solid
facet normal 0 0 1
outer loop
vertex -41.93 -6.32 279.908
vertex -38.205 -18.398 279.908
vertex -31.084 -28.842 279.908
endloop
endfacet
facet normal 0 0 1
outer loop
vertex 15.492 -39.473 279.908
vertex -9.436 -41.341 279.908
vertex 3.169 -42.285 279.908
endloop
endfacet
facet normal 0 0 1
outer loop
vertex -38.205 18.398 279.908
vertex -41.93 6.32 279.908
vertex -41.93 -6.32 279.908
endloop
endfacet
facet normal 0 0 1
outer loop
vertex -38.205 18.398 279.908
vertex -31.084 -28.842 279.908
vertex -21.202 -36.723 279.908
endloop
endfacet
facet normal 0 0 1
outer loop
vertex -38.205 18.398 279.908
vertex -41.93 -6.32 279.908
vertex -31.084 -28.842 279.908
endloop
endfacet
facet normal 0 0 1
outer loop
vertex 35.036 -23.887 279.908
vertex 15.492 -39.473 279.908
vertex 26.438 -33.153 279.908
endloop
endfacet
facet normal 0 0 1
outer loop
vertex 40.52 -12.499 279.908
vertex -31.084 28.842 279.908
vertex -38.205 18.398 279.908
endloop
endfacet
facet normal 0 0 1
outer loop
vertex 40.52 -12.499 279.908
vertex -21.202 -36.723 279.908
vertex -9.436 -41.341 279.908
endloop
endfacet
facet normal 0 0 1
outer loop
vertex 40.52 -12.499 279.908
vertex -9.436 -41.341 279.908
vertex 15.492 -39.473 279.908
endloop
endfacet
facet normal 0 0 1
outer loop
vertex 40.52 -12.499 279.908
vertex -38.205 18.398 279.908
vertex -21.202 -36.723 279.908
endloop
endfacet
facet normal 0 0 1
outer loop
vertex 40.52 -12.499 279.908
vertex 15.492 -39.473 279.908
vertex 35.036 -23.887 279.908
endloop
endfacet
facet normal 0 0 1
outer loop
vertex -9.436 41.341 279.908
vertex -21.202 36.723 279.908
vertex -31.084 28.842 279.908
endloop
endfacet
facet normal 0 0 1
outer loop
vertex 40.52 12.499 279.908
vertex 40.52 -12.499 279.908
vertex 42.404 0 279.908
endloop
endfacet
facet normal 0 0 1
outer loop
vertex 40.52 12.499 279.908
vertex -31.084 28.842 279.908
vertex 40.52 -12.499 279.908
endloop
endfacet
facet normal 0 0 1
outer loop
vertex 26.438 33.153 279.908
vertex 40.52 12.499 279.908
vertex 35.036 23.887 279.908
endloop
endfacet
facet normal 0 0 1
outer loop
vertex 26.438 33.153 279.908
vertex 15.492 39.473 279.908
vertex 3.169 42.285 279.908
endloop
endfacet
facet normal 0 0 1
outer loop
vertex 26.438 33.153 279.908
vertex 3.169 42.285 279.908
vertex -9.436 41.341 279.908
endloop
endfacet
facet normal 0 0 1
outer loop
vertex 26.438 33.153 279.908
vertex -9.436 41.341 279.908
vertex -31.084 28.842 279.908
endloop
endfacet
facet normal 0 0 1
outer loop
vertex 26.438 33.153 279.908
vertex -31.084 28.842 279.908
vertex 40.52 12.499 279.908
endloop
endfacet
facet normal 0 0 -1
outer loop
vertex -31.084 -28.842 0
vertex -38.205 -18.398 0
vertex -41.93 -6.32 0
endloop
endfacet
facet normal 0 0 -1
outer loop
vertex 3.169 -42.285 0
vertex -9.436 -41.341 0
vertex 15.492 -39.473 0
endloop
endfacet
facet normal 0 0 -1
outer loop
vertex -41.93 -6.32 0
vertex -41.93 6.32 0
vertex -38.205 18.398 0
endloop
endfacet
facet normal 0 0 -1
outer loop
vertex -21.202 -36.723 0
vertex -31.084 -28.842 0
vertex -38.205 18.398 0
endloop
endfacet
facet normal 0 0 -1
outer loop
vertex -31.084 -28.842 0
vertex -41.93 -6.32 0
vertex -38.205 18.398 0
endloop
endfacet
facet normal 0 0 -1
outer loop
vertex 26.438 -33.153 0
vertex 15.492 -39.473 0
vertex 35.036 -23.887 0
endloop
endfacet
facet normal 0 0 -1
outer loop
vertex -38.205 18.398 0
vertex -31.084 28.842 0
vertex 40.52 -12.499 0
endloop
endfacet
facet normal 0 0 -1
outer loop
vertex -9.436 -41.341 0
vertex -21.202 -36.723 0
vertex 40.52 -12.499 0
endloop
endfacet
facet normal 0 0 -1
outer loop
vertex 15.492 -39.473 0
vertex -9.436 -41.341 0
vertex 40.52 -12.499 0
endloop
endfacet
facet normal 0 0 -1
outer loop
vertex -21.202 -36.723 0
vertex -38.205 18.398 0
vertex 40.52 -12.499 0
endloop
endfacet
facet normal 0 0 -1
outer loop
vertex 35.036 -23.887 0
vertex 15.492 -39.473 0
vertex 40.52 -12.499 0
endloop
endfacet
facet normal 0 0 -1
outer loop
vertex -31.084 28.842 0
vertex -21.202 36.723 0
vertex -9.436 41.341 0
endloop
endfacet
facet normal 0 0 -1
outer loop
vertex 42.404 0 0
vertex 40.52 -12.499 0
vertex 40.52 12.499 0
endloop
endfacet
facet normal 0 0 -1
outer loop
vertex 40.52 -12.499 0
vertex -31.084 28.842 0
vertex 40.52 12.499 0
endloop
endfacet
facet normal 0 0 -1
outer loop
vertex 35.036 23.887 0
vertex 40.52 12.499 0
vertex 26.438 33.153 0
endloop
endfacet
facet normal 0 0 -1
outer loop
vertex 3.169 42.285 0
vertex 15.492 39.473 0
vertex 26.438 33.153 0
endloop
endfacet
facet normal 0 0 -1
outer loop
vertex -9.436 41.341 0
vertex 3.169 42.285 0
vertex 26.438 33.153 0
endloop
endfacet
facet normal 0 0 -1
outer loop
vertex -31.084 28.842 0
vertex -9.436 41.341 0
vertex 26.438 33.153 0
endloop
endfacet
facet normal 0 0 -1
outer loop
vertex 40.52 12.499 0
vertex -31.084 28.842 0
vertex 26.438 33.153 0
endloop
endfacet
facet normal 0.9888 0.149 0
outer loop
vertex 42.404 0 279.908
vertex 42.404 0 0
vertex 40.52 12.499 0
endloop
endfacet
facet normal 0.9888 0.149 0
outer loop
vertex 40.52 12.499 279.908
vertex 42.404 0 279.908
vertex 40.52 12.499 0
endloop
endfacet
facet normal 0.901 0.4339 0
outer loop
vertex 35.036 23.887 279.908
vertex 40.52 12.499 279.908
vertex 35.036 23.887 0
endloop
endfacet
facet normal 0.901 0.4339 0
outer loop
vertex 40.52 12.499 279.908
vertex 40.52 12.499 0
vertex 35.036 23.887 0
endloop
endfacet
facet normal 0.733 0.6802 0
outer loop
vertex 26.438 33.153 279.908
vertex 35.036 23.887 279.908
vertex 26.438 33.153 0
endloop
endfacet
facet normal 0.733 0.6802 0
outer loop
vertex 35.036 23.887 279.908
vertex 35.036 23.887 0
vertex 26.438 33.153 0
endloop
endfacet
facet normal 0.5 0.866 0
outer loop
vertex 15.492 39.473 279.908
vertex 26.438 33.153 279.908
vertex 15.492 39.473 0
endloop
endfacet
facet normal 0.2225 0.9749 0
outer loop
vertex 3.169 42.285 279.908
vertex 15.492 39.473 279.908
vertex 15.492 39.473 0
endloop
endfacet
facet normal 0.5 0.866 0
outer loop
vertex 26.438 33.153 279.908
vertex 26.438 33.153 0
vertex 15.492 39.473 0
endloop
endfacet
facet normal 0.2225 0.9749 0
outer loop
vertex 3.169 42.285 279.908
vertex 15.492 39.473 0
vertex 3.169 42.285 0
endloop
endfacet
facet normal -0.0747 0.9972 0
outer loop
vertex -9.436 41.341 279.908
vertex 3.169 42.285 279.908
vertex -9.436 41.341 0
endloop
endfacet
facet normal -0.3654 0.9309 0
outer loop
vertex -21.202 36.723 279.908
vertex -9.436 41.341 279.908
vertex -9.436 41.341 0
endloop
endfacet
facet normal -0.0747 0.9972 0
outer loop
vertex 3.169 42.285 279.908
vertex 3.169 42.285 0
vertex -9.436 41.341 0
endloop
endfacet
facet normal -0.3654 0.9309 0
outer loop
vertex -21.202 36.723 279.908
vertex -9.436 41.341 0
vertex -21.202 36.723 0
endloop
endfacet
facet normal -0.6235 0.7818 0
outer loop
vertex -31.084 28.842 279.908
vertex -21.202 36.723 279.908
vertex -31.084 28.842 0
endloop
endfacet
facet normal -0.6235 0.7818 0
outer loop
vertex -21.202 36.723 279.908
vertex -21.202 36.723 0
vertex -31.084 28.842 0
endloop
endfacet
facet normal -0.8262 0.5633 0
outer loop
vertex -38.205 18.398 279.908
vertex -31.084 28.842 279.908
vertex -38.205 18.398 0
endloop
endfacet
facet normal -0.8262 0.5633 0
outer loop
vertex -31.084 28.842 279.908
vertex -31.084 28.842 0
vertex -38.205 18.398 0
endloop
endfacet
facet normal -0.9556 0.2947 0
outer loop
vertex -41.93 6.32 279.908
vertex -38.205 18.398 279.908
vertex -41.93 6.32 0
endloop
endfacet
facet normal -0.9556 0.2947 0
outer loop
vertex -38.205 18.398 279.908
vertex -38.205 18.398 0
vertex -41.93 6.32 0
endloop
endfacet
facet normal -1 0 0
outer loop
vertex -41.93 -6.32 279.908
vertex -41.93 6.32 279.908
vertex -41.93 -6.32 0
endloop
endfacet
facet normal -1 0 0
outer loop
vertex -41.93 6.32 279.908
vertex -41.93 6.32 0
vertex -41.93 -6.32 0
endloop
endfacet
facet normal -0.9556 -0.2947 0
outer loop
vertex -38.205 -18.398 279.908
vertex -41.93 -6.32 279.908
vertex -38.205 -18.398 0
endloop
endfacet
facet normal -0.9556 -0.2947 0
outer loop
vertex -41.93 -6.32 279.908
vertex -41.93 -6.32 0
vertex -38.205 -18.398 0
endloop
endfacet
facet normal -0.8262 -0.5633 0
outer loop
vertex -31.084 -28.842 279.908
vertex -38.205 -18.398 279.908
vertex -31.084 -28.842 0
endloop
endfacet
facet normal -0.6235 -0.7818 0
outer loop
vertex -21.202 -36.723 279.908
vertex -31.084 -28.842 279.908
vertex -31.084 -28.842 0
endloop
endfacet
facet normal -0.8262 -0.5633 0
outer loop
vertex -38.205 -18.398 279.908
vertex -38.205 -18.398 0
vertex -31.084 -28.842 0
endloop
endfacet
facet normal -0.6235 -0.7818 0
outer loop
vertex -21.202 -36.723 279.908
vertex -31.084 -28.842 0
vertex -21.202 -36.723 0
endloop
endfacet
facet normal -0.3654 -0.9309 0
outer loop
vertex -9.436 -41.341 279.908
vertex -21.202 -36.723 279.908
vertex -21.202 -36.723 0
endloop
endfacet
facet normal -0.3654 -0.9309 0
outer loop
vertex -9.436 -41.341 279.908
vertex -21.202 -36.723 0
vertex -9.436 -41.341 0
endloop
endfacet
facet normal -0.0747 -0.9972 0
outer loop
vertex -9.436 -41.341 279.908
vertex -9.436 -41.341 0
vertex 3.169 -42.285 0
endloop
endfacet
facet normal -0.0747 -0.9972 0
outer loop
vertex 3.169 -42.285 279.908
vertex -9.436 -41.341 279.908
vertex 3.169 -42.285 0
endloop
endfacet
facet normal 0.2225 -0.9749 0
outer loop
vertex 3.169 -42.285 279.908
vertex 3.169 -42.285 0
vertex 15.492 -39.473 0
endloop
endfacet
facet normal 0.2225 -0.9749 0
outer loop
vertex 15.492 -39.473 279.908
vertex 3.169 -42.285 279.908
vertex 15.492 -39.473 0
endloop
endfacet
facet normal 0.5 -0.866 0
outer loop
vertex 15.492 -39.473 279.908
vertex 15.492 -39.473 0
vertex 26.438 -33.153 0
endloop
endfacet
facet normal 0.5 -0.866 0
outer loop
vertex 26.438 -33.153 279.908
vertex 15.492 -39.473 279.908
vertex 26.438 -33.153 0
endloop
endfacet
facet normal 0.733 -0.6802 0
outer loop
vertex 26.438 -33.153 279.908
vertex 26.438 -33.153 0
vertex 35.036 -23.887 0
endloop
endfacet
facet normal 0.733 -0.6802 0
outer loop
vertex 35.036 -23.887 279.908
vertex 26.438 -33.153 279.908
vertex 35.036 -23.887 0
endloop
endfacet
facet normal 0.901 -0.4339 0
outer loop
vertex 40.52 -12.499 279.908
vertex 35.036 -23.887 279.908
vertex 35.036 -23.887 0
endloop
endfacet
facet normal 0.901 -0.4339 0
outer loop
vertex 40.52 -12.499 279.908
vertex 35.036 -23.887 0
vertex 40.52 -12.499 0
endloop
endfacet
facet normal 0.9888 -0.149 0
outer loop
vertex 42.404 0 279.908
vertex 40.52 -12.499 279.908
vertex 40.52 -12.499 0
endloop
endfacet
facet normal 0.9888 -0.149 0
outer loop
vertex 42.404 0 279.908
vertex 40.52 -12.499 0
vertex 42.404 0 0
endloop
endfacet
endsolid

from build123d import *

# Parameters (mm, degrees)
F0_R       = 32.7181038806
F0_R_2     = 2.3607355304
F1_DEPTH   = 25.4
F2_DEPTH   = 64.008
F3_T       = -2.54
F5_R       = 42.4039305663
F6_DEPTH   = 25.4
F7_DEPTH   = 77.724
F8_R       = 42.4039305663
F7_FACE_R  = 42.4039305663
F6_FACE1_R = 42.4039305663
F9_DEPTH   = 127
F10_R      = 37.8949269506
F11_DEPTH  = 173.228
F12_DEPTH  = 279.908


with BuildPart() as f1:
    # F0 (on Top) → F1 (new body)
    with BuildSketch(Plane.XY):
        Circle(F0_R)
        Circle(F0_R_2, mode=Mode.SUBTRACT)
    extrude(amount=F1_DEPTH)

    # F2 (add): a face of the model
    f2_faces = [f1.faces().sort_by_distance(p)[0] for p in [
        (-31.7926961558, 0, 25.4),
    ]]
    extrude(f2_faces, amount=F2_DEPTH)

    # F3
    f3_openings = [f1.faces().sort_by_distance(p)[0] for p in [
        (-31.792696, 0, 89.408),
    ]]
    offset(amount=F3_T, openings=f3_openings)


with BuildPart() as f6:
    # F5 (on Top) → F6 (new body)
    with BuildSketch(Plane.XY):
        Circle(F5_R)
    extrude(amount=F6_DEPTH)

    # F7 (add): a face of the model
    f7_faces = [f6.faces().sort_by_distance(p)[0] for p in [
        (0, 0, 25.4),
    ]]
    extrude(f7_faces, amount=F7_DEPTH)

    # F8 (on face) + F7_face (on face) + F6_face1 (on face) → F9 (join)
    with BuildSketch(Plane.XY.offset(103.124)):
        Circle(F8_R)
    with BuildSketch(Plane.XY.offset(103.124)):
        Circle(F7_FACE_R)
    with BuildSketch(Plane(origin=(0, 0, 0), x_dir=(1, 0, 0), z_dir=(0, 0, -1))):
        Circle(F6_FACE1_R)
    extrude(amount=F9_DEPTH, dir=(0, 0, 1))

    # F10 (on Top) → F11 (join)
    with BuildSketch(Plane.XY):
        Circle(F10_R)
    extrude(amount=F11_DEPTH)

    # F12 (add): a face of the model
    f12_faces = [f6.faces().sort_by_distance(p)[0] for p in [
        (0, 0, 0),
    ]]
    extrude(f12_faces, amount=-F12_DEPTH)


solid = f6.part
